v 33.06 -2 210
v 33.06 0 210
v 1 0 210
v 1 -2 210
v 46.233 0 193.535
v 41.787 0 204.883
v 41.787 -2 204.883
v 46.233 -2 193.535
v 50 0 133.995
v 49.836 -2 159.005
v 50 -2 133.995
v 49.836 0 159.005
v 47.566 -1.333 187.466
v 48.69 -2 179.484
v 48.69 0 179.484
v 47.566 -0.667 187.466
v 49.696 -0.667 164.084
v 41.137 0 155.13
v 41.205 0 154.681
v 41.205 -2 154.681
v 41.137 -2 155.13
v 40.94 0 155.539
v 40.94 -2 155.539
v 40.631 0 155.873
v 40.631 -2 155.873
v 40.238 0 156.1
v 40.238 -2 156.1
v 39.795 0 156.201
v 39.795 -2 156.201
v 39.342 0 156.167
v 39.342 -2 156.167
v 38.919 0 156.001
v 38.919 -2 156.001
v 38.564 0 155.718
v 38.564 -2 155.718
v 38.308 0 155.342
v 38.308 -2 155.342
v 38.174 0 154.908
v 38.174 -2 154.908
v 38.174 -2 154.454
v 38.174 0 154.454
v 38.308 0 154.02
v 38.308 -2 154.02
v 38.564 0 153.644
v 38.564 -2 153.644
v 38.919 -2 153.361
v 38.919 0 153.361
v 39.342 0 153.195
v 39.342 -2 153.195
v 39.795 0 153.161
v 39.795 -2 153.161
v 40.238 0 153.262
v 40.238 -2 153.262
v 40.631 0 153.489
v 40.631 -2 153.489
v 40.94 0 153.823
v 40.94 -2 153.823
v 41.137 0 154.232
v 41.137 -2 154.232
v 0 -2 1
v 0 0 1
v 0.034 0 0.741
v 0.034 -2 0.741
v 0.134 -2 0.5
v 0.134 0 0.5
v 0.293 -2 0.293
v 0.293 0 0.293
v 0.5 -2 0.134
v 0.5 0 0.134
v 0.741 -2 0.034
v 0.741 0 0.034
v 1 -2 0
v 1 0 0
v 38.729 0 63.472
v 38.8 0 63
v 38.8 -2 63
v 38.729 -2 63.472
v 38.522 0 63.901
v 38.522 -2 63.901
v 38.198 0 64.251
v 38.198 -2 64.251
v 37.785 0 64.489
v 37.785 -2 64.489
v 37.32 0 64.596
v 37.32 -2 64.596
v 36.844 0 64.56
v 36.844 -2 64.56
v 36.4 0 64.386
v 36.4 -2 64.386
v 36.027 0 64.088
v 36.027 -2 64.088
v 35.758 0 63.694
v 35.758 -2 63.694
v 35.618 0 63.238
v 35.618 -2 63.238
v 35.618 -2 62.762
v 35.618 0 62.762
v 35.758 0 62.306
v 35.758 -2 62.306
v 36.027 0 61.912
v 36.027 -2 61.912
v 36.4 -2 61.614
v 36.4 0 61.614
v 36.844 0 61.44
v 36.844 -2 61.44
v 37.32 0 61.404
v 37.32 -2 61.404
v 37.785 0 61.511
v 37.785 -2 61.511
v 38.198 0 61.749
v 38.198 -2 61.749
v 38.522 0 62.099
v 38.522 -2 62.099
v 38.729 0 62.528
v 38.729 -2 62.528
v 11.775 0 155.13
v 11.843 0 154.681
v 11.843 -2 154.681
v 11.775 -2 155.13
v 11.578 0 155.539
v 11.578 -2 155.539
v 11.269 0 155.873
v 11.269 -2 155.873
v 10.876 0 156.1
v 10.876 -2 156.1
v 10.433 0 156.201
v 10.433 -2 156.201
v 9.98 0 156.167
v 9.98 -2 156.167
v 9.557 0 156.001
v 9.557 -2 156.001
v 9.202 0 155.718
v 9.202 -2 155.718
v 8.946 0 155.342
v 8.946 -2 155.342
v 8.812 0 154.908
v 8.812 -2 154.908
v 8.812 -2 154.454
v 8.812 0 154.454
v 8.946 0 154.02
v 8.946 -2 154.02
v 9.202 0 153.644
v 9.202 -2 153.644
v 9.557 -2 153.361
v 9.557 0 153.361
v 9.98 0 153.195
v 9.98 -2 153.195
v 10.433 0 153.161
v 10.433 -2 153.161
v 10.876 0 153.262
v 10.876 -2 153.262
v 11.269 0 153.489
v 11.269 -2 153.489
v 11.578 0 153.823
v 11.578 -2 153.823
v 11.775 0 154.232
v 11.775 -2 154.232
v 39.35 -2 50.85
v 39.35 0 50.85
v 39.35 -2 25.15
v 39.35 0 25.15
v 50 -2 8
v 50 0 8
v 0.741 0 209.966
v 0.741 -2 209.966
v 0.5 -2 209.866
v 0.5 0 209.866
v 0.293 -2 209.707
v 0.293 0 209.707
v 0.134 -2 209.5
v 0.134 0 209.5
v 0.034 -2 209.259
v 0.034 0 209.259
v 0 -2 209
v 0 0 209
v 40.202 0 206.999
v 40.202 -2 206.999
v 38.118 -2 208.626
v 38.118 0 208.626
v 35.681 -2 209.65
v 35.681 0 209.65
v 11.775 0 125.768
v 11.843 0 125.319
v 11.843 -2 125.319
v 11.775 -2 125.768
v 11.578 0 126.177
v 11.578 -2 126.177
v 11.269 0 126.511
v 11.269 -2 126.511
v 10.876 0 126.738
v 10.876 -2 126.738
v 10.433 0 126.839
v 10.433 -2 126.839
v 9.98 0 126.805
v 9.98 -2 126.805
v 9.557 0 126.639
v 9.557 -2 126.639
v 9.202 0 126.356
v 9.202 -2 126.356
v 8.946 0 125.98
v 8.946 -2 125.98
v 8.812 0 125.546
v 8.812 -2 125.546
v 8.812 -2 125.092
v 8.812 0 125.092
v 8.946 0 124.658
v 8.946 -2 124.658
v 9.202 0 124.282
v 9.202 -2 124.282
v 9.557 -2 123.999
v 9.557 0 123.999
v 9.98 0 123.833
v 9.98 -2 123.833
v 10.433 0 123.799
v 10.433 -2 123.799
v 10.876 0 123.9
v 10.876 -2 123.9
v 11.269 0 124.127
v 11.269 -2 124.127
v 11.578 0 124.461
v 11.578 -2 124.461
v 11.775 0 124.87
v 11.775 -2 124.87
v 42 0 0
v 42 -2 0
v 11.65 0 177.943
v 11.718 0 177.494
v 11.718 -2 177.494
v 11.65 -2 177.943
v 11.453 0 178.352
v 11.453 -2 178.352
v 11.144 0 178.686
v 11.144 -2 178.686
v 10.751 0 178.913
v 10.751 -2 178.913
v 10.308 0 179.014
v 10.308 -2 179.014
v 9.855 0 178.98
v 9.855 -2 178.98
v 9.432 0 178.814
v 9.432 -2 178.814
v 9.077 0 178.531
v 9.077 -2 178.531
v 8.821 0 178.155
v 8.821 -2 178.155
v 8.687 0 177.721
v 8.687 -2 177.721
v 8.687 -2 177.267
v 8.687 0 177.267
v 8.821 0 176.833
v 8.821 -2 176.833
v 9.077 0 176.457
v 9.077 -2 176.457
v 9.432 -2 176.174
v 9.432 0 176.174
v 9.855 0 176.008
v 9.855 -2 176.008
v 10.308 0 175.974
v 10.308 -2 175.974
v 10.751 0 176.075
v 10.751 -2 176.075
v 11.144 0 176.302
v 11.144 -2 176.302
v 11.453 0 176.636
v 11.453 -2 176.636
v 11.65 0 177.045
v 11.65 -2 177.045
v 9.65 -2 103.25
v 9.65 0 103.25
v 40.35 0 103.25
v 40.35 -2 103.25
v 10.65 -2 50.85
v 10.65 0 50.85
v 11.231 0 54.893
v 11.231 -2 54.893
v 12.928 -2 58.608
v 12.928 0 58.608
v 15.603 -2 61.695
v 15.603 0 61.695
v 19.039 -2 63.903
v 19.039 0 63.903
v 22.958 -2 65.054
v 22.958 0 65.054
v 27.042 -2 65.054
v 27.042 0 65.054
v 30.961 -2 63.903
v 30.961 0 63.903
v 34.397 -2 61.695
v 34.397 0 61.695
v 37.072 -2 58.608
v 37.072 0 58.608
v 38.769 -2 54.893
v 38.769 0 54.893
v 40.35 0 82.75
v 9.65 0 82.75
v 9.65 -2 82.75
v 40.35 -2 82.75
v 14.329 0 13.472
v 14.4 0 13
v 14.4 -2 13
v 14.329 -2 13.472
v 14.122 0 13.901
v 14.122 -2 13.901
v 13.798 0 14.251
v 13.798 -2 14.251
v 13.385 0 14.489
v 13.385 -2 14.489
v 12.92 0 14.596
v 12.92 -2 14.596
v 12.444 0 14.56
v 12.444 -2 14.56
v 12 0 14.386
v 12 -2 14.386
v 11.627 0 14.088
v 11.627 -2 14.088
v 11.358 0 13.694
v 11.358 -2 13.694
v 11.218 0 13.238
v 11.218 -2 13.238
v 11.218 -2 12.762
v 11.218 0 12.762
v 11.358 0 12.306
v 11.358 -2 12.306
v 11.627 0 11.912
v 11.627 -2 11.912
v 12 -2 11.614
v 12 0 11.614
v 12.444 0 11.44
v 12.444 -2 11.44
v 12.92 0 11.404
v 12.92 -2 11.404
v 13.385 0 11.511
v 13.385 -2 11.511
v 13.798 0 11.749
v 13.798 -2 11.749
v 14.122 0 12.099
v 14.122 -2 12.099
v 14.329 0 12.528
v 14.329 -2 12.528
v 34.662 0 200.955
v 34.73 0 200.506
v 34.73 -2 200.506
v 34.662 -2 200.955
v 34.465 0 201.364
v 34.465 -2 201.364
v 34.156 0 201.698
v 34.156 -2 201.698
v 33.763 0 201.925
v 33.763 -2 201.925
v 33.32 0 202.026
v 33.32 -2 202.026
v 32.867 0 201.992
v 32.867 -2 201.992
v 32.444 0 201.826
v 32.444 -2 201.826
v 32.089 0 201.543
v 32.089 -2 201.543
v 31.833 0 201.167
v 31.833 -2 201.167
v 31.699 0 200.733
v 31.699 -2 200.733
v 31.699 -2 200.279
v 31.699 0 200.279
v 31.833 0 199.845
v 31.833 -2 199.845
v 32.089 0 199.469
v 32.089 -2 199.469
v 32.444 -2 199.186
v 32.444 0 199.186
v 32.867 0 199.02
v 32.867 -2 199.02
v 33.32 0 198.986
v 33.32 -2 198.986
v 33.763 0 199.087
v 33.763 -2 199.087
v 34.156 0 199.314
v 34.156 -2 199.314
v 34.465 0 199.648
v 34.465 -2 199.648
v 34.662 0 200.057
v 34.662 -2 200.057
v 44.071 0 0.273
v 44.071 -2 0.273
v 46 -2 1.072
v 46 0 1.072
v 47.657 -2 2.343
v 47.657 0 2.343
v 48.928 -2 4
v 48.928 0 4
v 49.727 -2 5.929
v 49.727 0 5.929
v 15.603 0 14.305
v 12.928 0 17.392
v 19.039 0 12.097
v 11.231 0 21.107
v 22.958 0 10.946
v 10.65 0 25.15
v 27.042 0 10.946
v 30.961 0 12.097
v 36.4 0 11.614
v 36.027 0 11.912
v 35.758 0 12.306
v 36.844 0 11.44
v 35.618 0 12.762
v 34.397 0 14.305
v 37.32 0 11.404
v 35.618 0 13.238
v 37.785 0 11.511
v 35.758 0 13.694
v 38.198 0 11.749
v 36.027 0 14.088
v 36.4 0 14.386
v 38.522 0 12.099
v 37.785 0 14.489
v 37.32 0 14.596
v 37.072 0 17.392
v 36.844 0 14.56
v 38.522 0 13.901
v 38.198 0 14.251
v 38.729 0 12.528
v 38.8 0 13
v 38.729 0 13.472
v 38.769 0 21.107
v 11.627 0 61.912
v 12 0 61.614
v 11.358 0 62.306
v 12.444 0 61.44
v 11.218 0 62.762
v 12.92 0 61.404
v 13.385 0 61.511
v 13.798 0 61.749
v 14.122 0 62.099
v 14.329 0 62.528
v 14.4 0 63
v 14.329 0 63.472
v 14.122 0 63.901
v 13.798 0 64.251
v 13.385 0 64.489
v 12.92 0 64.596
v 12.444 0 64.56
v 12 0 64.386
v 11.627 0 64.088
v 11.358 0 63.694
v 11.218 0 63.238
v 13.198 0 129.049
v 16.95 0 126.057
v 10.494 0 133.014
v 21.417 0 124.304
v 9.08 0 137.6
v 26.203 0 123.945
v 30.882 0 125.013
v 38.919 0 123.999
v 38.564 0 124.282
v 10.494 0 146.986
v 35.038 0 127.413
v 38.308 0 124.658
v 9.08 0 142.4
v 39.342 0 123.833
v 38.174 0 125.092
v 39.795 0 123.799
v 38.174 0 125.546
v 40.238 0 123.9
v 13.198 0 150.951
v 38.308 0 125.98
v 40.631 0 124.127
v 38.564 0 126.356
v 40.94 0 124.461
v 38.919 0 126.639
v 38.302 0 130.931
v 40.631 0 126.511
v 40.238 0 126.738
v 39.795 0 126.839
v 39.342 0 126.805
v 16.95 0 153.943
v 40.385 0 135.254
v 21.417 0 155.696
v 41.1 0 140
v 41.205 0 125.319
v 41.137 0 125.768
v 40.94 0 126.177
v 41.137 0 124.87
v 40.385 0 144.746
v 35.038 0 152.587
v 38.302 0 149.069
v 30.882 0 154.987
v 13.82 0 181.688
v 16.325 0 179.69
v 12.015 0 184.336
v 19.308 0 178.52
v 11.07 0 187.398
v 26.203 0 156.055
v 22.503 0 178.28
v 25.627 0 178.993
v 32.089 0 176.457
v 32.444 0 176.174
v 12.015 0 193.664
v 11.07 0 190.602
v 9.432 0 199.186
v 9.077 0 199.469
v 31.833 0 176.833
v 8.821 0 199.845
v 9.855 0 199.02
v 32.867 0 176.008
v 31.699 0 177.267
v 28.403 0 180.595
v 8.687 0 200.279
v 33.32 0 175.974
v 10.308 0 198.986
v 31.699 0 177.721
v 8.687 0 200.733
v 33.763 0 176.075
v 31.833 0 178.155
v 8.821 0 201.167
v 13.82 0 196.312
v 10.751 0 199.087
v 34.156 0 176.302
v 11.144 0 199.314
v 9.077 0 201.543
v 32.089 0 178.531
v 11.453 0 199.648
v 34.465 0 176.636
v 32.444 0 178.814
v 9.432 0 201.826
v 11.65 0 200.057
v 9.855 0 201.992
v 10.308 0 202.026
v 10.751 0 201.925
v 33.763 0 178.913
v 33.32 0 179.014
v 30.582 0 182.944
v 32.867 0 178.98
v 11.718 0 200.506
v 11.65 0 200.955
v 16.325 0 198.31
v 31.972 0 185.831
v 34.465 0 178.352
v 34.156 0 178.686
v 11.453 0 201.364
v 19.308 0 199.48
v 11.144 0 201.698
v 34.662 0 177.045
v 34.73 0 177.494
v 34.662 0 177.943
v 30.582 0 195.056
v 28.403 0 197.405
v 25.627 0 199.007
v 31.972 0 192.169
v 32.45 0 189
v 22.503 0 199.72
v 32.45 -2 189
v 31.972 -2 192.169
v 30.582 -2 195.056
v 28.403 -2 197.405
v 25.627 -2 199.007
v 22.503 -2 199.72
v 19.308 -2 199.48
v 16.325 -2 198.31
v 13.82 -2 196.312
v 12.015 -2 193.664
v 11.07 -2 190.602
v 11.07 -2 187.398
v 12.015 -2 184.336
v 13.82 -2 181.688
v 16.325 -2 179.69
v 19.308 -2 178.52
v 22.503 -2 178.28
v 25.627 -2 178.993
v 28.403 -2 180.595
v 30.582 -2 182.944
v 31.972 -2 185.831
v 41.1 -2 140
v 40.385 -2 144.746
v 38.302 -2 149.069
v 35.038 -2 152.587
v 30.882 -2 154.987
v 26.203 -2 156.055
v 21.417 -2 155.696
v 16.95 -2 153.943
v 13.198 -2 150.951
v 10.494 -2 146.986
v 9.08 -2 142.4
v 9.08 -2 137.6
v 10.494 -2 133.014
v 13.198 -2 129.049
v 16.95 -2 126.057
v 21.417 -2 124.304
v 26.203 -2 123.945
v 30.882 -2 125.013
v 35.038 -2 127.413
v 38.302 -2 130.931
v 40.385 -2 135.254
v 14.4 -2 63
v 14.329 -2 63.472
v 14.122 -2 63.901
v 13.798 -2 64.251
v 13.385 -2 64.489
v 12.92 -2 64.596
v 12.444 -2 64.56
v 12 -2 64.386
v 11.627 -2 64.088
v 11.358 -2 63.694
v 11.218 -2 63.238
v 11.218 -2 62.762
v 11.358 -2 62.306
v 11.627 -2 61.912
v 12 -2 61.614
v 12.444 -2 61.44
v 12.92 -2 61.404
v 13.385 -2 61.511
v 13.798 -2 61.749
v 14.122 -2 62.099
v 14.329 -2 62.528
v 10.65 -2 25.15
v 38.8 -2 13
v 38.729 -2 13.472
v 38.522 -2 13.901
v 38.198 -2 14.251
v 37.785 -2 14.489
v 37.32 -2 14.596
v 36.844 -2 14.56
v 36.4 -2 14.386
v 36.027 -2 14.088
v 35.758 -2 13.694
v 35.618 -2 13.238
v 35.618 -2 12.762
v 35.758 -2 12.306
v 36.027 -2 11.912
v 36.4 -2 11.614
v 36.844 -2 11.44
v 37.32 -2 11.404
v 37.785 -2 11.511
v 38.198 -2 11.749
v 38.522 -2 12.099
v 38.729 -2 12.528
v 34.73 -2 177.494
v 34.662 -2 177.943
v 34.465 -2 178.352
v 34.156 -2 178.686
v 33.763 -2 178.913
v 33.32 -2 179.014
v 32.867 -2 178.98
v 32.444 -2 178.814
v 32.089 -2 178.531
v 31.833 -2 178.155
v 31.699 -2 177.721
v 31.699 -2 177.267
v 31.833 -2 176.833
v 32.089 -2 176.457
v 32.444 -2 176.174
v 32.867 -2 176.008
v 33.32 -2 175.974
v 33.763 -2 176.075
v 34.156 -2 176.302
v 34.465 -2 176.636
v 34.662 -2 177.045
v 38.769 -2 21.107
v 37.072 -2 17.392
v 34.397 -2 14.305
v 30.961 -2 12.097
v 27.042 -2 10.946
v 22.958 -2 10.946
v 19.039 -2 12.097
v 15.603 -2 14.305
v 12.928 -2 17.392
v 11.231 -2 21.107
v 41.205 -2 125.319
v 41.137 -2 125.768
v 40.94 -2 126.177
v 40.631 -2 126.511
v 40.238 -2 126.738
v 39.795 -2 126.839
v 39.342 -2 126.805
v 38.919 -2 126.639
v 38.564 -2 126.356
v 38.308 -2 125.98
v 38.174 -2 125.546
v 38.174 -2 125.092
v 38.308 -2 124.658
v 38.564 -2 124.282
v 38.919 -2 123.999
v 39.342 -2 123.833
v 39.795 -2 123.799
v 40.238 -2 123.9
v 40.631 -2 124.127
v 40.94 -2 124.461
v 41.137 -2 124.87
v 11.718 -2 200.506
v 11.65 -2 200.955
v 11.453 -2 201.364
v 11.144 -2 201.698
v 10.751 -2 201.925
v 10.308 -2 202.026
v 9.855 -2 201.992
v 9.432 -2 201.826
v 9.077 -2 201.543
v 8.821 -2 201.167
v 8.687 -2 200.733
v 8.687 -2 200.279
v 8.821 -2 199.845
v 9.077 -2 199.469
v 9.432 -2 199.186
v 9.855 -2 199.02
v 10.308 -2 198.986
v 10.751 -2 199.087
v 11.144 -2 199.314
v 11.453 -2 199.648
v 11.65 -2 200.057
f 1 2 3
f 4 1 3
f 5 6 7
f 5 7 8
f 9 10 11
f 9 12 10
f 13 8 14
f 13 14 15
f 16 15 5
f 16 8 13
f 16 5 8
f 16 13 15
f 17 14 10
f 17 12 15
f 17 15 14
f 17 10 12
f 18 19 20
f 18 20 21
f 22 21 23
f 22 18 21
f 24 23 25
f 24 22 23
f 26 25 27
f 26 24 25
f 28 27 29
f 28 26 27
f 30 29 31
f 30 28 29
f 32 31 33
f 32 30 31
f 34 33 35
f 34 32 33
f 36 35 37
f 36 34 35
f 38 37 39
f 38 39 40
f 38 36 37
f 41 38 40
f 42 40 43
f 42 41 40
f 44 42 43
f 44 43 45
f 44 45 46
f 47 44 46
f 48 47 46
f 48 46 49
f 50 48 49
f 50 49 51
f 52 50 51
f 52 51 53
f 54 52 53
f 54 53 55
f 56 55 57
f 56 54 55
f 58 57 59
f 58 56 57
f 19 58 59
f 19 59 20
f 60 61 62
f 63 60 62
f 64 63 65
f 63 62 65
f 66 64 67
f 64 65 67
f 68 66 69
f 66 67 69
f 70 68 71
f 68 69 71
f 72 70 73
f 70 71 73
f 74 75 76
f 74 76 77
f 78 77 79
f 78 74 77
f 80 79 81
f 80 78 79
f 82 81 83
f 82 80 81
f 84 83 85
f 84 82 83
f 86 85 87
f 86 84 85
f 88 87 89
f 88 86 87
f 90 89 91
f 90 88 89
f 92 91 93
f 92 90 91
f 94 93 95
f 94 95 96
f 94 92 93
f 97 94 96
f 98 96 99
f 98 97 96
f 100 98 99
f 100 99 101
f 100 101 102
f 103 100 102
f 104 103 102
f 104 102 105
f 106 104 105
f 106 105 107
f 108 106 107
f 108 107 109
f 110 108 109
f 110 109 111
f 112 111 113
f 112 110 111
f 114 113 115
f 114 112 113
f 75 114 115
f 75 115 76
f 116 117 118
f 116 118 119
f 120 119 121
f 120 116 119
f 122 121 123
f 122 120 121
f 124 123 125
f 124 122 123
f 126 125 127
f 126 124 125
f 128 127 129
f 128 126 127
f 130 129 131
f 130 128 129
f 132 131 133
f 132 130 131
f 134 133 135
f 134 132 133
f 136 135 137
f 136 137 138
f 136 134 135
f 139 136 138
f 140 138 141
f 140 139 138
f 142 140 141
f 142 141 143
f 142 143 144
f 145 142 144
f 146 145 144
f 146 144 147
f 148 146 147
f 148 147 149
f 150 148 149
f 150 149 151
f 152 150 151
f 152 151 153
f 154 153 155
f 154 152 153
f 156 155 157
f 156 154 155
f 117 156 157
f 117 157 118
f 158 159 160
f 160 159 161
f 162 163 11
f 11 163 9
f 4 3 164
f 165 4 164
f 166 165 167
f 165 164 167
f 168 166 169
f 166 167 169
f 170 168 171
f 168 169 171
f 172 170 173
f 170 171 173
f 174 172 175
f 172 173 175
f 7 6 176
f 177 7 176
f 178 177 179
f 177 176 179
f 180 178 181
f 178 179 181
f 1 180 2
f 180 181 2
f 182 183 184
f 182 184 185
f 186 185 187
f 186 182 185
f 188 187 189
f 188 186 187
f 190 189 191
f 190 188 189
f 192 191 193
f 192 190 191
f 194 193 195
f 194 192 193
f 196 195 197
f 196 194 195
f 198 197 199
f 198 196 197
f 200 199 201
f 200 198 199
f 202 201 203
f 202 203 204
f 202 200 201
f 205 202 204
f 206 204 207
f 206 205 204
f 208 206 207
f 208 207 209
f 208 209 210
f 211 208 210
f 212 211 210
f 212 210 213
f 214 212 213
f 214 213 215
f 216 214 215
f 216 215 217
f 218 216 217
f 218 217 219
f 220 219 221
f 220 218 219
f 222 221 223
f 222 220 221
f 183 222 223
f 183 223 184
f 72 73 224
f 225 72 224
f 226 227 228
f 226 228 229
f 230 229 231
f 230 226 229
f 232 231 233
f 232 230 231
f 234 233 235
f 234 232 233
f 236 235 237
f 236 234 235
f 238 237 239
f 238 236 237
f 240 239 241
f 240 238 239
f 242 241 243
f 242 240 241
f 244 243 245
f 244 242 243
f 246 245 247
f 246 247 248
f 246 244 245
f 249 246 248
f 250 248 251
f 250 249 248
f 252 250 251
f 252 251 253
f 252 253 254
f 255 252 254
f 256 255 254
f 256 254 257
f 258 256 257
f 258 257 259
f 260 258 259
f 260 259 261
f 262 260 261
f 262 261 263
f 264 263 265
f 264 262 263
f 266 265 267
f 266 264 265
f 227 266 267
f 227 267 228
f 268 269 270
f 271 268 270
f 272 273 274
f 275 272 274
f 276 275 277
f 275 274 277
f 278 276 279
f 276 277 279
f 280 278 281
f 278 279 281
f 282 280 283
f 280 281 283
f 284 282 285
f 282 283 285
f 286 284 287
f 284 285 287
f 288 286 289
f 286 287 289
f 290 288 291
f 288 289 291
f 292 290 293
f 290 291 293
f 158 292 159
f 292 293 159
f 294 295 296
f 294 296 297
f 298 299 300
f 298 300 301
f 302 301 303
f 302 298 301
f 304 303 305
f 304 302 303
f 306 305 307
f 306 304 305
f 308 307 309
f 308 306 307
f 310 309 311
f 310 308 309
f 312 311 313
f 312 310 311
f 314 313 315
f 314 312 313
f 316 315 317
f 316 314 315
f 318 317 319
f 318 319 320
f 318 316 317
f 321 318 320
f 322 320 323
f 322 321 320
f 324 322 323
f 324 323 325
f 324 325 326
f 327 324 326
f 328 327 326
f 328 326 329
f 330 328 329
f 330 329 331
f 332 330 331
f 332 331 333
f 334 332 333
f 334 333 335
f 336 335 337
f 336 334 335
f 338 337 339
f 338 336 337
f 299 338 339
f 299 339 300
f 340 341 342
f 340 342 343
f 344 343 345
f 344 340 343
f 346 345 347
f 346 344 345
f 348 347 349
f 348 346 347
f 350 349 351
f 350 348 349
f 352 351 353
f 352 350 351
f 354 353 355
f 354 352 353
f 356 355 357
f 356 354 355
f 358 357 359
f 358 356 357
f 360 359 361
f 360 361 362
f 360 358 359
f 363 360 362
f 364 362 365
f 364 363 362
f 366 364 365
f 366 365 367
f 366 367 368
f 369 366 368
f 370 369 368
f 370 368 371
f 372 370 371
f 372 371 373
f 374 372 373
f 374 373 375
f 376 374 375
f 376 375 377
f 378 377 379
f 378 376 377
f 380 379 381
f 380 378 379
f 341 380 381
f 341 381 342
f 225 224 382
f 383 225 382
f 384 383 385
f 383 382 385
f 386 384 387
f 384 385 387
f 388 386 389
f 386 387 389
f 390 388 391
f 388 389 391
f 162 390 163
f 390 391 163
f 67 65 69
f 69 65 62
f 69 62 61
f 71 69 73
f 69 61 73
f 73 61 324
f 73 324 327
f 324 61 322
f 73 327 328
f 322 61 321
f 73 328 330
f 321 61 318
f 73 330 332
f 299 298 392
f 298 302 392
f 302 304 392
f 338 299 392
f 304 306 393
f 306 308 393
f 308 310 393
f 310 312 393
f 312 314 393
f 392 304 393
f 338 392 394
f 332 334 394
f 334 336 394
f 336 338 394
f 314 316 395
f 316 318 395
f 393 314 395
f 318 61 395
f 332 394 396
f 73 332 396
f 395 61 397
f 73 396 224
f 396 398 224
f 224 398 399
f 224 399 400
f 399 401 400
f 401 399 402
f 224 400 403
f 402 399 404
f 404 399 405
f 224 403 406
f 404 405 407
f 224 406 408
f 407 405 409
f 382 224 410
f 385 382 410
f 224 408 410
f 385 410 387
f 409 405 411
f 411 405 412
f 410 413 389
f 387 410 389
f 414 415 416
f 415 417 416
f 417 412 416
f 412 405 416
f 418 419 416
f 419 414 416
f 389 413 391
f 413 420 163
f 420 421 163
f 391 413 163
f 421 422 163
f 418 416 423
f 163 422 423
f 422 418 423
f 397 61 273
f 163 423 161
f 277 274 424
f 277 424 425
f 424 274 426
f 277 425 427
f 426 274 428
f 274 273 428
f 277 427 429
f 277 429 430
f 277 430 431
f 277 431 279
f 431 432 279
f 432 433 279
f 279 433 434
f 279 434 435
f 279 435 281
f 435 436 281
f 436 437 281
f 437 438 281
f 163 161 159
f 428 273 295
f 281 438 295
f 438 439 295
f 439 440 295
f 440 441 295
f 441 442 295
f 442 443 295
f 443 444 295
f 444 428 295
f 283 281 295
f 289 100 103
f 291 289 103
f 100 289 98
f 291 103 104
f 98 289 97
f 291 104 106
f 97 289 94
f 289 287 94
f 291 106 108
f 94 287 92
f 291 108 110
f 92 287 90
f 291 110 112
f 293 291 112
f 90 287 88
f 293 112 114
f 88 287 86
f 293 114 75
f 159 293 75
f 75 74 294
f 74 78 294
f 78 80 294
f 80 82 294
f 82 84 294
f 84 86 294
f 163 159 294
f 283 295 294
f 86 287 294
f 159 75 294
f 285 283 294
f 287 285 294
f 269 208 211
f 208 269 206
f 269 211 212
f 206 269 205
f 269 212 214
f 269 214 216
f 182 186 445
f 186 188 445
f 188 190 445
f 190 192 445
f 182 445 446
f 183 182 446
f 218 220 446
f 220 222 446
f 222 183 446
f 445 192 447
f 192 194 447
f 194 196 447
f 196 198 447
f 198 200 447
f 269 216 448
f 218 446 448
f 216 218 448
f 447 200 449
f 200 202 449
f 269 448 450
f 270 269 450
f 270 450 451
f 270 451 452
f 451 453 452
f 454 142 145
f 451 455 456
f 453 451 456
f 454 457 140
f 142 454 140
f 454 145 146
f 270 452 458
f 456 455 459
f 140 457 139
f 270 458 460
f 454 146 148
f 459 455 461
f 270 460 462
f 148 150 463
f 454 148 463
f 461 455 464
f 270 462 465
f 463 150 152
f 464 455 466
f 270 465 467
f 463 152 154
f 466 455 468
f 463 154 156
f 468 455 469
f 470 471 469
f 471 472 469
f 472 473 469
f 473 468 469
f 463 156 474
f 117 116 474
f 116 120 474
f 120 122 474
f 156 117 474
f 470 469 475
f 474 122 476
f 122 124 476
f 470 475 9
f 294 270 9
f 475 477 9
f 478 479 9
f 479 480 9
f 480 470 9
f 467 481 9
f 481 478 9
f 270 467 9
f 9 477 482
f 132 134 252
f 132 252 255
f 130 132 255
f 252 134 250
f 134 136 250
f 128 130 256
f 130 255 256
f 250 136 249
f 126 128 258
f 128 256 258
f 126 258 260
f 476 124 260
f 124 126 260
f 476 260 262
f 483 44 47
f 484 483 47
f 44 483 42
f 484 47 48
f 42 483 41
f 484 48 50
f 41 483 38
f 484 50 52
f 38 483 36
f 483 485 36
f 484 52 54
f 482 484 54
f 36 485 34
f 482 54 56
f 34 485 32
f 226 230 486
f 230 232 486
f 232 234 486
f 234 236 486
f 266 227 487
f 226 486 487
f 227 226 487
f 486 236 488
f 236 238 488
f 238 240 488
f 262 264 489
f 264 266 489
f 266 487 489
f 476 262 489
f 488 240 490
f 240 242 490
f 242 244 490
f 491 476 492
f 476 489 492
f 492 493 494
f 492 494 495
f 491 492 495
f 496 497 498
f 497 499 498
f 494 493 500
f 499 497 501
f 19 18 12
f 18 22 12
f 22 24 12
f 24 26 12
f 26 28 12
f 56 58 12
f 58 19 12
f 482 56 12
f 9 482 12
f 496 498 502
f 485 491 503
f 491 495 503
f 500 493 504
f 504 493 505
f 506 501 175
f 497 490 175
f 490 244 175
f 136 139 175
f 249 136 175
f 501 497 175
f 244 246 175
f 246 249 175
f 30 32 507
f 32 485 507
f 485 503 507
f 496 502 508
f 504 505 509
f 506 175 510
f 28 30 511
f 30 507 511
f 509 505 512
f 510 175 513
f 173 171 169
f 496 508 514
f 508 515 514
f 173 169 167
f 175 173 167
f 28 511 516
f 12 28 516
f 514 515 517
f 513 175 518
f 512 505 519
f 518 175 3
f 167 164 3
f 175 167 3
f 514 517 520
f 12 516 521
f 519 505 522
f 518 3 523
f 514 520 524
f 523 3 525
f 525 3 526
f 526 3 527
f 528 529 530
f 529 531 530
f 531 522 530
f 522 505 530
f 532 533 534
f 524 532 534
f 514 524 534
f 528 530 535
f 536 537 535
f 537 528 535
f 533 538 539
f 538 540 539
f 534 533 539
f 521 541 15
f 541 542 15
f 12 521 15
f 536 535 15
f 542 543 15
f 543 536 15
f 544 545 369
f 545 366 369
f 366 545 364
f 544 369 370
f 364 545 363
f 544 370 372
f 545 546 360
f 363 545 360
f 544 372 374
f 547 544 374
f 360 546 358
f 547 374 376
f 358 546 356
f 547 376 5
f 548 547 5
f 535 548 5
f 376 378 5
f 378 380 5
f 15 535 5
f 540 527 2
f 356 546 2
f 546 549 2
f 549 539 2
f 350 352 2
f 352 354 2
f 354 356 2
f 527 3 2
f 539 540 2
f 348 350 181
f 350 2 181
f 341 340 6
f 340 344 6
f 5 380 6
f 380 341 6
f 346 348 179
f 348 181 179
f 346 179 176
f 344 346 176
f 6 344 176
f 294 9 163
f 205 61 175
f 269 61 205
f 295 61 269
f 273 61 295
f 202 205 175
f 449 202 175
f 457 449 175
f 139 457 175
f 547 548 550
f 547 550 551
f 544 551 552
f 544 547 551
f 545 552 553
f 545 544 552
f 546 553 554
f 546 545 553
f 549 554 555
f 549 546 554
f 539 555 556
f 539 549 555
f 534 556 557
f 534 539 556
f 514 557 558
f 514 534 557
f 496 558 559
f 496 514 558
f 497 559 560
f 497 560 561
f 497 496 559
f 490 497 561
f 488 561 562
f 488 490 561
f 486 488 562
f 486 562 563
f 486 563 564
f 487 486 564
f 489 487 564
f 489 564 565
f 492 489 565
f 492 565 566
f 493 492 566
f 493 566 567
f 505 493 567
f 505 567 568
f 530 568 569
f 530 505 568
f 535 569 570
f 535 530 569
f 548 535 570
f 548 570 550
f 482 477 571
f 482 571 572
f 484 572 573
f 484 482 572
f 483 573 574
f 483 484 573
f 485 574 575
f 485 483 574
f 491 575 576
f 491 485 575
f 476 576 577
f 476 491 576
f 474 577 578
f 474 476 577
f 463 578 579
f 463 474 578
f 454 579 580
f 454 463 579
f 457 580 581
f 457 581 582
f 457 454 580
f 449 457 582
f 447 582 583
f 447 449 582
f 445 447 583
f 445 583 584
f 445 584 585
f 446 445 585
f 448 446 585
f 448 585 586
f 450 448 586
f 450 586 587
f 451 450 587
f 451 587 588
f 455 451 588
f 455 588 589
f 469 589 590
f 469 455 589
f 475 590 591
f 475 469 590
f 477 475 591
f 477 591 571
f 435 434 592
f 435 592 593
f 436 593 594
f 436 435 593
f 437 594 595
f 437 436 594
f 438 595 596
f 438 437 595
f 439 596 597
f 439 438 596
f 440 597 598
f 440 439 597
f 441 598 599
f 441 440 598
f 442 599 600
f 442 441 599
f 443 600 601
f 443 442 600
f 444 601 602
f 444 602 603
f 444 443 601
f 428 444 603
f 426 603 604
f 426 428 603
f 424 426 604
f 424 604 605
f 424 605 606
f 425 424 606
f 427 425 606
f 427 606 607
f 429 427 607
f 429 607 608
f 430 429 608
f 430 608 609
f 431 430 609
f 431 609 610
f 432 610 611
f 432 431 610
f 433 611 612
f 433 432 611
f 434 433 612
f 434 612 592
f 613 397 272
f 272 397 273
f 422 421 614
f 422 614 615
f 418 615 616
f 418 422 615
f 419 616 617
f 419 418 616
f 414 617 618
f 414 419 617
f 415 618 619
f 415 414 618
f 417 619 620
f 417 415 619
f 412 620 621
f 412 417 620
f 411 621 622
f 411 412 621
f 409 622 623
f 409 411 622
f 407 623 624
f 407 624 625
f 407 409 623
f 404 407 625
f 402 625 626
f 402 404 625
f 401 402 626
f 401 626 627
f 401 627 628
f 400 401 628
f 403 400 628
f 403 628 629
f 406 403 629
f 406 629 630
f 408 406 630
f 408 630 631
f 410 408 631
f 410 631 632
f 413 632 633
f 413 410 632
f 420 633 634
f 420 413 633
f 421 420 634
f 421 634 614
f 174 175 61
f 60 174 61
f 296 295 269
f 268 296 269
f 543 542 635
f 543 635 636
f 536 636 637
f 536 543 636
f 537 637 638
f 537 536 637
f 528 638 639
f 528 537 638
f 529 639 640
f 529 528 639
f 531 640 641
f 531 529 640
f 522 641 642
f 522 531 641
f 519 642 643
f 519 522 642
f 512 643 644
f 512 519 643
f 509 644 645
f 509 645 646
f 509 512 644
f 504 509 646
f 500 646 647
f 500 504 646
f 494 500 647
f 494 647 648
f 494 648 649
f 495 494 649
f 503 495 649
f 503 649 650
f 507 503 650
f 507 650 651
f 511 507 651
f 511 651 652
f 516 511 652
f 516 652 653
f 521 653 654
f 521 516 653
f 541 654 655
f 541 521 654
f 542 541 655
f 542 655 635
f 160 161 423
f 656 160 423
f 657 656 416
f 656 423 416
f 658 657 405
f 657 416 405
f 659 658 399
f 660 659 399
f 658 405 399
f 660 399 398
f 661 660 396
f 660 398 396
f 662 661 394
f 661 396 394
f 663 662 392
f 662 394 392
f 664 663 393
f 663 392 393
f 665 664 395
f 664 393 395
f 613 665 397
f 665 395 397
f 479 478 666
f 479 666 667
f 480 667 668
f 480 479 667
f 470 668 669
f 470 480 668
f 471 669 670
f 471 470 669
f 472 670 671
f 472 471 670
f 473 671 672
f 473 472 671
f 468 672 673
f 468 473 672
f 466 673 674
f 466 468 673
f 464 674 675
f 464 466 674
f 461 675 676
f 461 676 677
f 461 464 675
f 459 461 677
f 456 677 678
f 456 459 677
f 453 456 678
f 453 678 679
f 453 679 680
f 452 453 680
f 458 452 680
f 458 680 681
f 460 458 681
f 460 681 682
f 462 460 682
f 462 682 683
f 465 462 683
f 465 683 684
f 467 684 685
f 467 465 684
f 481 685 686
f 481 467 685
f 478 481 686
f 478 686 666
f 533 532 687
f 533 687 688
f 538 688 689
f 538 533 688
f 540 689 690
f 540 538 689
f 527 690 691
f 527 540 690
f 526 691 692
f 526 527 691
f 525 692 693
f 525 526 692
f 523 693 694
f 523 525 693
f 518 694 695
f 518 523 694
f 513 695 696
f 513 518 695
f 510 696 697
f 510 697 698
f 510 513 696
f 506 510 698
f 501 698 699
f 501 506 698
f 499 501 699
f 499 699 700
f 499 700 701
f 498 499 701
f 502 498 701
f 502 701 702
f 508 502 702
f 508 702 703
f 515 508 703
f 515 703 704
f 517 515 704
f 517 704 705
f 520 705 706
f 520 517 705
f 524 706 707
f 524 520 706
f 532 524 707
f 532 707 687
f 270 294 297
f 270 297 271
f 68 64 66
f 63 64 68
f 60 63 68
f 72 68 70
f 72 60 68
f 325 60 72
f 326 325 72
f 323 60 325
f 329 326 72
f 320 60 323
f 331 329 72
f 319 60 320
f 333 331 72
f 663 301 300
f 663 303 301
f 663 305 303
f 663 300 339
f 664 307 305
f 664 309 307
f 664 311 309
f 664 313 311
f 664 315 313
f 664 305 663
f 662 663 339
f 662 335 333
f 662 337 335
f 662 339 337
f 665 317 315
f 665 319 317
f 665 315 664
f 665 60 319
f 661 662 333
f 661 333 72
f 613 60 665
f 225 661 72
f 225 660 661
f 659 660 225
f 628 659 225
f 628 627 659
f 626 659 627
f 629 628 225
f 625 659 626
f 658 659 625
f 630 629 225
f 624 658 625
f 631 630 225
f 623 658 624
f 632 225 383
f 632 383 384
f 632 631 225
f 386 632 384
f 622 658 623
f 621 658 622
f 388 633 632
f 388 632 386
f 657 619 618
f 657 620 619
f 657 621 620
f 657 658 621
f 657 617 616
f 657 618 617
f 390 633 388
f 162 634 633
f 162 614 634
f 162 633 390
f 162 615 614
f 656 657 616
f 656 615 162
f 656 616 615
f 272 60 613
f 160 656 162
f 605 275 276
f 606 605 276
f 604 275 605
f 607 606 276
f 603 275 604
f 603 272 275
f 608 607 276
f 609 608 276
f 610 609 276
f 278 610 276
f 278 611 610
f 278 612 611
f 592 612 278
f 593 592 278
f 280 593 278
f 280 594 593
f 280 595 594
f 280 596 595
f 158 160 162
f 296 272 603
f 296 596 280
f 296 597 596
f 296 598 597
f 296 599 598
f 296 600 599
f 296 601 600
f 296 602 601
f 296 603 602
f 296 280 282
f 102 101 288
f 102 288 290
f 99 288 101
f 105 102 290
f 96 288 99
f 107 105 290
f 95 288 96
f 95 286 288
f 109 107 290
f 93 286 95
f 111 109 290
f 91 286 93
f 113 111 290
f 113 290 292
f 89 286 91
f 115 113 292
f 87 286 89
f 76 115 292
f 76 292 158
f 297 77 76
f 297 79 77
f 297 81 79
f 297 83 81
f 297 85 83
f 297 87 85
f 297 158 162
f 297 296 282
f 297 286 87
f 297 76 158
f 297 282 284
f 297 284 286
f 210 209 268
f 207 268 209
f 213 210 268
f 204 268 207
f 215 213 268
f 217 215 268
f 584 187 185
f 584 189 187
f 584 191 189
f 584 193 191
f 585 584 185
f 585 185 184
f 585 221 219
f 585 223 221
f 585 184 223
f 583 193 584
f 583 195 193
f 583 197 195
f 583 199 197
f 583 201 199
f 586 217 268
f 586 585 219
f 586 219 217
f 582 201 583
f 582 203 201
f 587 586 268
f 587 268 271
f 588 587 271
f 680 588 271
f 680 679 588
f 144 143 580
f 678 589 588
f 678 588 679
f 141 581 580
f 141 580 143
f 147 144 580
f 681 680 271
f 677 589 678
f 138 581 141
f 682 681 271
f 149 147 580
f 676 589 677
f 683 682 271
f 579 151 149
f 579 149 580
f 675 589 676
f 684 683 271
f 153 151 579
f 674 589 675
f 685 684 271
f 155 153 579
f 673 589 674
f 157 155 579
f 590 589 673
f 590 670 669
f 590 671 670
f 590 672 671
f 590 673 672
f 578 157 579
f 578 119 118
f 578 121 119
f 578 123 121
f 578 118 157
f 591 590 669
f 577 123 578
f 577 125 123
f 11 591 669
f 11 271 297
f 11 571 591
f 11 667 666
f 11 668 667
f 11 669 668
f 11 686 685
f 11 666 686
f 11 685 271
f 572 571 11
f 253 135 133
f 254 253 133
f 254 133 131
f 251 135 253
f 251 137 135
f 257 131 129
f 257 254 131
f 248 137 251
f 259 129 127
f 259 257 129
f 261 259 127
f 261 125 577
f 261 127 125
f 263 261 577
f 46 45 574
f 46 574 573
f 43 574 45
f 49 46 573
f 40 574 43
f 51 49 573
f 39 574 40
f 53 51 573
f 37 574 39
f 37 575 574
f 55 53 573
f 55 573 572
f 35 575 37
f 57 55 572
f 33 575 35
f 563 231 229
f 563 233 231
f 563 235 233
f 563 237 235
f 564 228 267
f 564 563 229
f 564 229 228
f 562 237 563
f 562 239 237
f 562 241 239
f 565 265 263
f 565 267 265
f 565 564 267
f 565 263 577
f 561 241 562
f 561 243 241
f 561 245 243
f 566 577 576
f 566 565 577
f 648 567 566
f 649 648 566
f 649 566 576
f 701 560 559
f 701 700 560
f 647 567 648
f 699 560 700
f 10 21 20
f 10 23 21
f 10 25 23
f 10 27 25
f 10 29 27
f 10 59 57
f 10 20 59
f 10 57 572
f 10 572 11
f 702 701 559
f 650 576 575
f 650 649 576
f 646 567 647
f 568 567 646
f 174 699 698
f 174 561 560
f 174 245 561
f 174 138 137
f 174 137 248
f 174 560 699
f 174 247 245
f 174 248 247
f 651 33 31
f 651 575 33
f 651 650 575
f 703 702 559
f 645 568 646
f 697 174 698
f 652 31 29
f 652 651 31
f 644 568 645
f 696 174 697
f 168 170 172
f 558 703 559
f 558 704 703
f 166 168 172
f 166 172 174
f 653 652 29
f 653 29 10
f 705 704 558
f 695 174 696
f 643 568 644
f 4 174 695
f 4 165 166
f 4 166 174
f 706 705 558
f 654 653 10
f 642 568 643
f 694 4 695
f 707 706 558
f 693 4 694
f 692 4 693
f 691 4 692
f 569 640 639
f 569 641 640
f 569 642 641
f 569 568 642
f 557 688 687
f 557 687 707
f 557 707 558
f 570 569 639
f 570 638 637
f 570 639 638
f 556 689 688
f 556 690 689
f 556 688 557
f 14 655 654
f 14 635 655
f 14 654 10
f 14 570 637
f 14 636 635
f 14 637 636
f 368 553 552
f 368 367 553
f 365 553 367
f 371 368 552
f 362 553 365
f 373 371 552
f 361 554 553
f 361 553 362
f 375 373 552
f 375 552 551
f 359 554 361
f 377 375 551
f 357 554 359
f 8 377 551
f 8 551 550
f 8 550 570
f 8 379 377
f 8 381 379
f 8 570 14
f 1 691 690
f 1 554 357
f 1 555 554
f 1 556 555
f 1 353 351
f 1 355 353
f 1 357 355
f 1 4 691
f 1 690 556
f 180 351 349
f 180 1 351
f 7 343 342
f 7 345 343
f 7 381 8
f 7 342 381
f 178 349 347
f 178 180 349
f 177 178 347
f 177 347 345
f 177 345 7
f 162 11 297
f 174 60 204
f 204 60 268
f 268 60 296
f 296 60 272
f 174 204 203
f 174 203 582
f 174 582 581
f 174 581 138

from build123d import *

# Parameters (mm, degrees)
F0_R     = 1.6
F0_W     = 30.7
F0_H     = 20.5
F0_R_2   = 1.524
F0_R_3   = 16.1
F0_R_4   = 10.75
F1_DEPTH = 2


with BuildPart() as f1:
    # F0 (on Front) → F1 (new body)
    with BuildSketch(Plane.XZ):
        with BuildLine():
            ThreePointArc((0, 1), (0.292893, 0.292893), (1, 0))
            Line((1, 0), (42, 0))
            ThreePointArc((42, 0), (47.656854, 2.343146), (50, 8))
            Line((50, 8), (50, 133.995056))
            add(Edge.make_bspline(
                [(41.786822, 204.882652), (50, 190.202921), (50, 167.68368), (50, 133.995056)],
                knots=[8.50185, 8.50185, 8.50185, 8.50185, 76.896032, 76.896032, 76.896032, 76.896032], degree=3))
            ThreePointArc((41.786822, 204.882652), (38.118203, 208.626312), (33.059869, 210))
            Line((33.059869, 210), (1, 210))
            ThreePointArc((1, 210), (0.292893, 209.707107), (0, 209))
            Line((0, 209), (0, 1))
        make_face()
        with Locations((12.8, 13)):
            Circle(F0_R, mode=Mode.SUBTRACT)
        with BuildLine():
            ThreePointArc((39.35, 25.15), (25, 10.8), (10.65, 25.15))
            Line((10.65, 25.15), (10.65, 50.85))
            ThreePointArc((10.65, 50.85), (25, 65.2), (39.35, 50.85))
            Line((39.35, 50.85), (39.35, 25.15))
        make_face(mode=Mode.SUBTRACT)
        with Locations((12.8, 63)):
            Circle(F0_R, mode=Mode.SUBTRACT)
        with Locations((25, 93)):
            Rectangle(F0_W, F0_H, mode=Mode.SUBTRACT)
        with Locations((37.2, 13)):
            Circle(F0_R, mode=Mode.SUBTRACT)
        with Locations((37.2, 63)):
            Circle(F0_R, mode=Mode.SUBTRACT)
        with Locations((10.319, 125.319)):
            Circle(F0_R_2, mode=Mode.SUBTRACT)
        with Locations((10.319, 154.681)):
            Circle(F0_R_2, mode=Mode.SUBTRACT)
        with Locations((25, 140)):
            Circle(F0_R_3, mode=Mode.SUBTRACT)
        with Locations((10.194, 177.494)):
            Circle(F0_R_2, mode=Mode.SUBTRACT)
        with Locations((10.194, 200.506)):
            Circle(F0_R_2, mode=Mode.SUBTRACT)
        with Locations((21.7, 189)):
            Circle(F0_R_4, mode=Mode.SUBTRACT)
        with Locations((39.681, 125.319)):
            Circle(F0_R_2, mode=Mode.SUBTRACT)
        with Locations((39.681, 154.681)):
            Circle(F0_R_2, mode=Mode.SUBTRACT)
        with Locations((33.206, 177.494)):
            Circle(F0_R_2, mode=Mode.SUBTRACT)
        with Locations((33.206, 200.506)):
            Circle(F0_R_2, mode=Mode.SUBTRACT)
    extrude(amount=F1_DEPTH)


solid = f1.part
